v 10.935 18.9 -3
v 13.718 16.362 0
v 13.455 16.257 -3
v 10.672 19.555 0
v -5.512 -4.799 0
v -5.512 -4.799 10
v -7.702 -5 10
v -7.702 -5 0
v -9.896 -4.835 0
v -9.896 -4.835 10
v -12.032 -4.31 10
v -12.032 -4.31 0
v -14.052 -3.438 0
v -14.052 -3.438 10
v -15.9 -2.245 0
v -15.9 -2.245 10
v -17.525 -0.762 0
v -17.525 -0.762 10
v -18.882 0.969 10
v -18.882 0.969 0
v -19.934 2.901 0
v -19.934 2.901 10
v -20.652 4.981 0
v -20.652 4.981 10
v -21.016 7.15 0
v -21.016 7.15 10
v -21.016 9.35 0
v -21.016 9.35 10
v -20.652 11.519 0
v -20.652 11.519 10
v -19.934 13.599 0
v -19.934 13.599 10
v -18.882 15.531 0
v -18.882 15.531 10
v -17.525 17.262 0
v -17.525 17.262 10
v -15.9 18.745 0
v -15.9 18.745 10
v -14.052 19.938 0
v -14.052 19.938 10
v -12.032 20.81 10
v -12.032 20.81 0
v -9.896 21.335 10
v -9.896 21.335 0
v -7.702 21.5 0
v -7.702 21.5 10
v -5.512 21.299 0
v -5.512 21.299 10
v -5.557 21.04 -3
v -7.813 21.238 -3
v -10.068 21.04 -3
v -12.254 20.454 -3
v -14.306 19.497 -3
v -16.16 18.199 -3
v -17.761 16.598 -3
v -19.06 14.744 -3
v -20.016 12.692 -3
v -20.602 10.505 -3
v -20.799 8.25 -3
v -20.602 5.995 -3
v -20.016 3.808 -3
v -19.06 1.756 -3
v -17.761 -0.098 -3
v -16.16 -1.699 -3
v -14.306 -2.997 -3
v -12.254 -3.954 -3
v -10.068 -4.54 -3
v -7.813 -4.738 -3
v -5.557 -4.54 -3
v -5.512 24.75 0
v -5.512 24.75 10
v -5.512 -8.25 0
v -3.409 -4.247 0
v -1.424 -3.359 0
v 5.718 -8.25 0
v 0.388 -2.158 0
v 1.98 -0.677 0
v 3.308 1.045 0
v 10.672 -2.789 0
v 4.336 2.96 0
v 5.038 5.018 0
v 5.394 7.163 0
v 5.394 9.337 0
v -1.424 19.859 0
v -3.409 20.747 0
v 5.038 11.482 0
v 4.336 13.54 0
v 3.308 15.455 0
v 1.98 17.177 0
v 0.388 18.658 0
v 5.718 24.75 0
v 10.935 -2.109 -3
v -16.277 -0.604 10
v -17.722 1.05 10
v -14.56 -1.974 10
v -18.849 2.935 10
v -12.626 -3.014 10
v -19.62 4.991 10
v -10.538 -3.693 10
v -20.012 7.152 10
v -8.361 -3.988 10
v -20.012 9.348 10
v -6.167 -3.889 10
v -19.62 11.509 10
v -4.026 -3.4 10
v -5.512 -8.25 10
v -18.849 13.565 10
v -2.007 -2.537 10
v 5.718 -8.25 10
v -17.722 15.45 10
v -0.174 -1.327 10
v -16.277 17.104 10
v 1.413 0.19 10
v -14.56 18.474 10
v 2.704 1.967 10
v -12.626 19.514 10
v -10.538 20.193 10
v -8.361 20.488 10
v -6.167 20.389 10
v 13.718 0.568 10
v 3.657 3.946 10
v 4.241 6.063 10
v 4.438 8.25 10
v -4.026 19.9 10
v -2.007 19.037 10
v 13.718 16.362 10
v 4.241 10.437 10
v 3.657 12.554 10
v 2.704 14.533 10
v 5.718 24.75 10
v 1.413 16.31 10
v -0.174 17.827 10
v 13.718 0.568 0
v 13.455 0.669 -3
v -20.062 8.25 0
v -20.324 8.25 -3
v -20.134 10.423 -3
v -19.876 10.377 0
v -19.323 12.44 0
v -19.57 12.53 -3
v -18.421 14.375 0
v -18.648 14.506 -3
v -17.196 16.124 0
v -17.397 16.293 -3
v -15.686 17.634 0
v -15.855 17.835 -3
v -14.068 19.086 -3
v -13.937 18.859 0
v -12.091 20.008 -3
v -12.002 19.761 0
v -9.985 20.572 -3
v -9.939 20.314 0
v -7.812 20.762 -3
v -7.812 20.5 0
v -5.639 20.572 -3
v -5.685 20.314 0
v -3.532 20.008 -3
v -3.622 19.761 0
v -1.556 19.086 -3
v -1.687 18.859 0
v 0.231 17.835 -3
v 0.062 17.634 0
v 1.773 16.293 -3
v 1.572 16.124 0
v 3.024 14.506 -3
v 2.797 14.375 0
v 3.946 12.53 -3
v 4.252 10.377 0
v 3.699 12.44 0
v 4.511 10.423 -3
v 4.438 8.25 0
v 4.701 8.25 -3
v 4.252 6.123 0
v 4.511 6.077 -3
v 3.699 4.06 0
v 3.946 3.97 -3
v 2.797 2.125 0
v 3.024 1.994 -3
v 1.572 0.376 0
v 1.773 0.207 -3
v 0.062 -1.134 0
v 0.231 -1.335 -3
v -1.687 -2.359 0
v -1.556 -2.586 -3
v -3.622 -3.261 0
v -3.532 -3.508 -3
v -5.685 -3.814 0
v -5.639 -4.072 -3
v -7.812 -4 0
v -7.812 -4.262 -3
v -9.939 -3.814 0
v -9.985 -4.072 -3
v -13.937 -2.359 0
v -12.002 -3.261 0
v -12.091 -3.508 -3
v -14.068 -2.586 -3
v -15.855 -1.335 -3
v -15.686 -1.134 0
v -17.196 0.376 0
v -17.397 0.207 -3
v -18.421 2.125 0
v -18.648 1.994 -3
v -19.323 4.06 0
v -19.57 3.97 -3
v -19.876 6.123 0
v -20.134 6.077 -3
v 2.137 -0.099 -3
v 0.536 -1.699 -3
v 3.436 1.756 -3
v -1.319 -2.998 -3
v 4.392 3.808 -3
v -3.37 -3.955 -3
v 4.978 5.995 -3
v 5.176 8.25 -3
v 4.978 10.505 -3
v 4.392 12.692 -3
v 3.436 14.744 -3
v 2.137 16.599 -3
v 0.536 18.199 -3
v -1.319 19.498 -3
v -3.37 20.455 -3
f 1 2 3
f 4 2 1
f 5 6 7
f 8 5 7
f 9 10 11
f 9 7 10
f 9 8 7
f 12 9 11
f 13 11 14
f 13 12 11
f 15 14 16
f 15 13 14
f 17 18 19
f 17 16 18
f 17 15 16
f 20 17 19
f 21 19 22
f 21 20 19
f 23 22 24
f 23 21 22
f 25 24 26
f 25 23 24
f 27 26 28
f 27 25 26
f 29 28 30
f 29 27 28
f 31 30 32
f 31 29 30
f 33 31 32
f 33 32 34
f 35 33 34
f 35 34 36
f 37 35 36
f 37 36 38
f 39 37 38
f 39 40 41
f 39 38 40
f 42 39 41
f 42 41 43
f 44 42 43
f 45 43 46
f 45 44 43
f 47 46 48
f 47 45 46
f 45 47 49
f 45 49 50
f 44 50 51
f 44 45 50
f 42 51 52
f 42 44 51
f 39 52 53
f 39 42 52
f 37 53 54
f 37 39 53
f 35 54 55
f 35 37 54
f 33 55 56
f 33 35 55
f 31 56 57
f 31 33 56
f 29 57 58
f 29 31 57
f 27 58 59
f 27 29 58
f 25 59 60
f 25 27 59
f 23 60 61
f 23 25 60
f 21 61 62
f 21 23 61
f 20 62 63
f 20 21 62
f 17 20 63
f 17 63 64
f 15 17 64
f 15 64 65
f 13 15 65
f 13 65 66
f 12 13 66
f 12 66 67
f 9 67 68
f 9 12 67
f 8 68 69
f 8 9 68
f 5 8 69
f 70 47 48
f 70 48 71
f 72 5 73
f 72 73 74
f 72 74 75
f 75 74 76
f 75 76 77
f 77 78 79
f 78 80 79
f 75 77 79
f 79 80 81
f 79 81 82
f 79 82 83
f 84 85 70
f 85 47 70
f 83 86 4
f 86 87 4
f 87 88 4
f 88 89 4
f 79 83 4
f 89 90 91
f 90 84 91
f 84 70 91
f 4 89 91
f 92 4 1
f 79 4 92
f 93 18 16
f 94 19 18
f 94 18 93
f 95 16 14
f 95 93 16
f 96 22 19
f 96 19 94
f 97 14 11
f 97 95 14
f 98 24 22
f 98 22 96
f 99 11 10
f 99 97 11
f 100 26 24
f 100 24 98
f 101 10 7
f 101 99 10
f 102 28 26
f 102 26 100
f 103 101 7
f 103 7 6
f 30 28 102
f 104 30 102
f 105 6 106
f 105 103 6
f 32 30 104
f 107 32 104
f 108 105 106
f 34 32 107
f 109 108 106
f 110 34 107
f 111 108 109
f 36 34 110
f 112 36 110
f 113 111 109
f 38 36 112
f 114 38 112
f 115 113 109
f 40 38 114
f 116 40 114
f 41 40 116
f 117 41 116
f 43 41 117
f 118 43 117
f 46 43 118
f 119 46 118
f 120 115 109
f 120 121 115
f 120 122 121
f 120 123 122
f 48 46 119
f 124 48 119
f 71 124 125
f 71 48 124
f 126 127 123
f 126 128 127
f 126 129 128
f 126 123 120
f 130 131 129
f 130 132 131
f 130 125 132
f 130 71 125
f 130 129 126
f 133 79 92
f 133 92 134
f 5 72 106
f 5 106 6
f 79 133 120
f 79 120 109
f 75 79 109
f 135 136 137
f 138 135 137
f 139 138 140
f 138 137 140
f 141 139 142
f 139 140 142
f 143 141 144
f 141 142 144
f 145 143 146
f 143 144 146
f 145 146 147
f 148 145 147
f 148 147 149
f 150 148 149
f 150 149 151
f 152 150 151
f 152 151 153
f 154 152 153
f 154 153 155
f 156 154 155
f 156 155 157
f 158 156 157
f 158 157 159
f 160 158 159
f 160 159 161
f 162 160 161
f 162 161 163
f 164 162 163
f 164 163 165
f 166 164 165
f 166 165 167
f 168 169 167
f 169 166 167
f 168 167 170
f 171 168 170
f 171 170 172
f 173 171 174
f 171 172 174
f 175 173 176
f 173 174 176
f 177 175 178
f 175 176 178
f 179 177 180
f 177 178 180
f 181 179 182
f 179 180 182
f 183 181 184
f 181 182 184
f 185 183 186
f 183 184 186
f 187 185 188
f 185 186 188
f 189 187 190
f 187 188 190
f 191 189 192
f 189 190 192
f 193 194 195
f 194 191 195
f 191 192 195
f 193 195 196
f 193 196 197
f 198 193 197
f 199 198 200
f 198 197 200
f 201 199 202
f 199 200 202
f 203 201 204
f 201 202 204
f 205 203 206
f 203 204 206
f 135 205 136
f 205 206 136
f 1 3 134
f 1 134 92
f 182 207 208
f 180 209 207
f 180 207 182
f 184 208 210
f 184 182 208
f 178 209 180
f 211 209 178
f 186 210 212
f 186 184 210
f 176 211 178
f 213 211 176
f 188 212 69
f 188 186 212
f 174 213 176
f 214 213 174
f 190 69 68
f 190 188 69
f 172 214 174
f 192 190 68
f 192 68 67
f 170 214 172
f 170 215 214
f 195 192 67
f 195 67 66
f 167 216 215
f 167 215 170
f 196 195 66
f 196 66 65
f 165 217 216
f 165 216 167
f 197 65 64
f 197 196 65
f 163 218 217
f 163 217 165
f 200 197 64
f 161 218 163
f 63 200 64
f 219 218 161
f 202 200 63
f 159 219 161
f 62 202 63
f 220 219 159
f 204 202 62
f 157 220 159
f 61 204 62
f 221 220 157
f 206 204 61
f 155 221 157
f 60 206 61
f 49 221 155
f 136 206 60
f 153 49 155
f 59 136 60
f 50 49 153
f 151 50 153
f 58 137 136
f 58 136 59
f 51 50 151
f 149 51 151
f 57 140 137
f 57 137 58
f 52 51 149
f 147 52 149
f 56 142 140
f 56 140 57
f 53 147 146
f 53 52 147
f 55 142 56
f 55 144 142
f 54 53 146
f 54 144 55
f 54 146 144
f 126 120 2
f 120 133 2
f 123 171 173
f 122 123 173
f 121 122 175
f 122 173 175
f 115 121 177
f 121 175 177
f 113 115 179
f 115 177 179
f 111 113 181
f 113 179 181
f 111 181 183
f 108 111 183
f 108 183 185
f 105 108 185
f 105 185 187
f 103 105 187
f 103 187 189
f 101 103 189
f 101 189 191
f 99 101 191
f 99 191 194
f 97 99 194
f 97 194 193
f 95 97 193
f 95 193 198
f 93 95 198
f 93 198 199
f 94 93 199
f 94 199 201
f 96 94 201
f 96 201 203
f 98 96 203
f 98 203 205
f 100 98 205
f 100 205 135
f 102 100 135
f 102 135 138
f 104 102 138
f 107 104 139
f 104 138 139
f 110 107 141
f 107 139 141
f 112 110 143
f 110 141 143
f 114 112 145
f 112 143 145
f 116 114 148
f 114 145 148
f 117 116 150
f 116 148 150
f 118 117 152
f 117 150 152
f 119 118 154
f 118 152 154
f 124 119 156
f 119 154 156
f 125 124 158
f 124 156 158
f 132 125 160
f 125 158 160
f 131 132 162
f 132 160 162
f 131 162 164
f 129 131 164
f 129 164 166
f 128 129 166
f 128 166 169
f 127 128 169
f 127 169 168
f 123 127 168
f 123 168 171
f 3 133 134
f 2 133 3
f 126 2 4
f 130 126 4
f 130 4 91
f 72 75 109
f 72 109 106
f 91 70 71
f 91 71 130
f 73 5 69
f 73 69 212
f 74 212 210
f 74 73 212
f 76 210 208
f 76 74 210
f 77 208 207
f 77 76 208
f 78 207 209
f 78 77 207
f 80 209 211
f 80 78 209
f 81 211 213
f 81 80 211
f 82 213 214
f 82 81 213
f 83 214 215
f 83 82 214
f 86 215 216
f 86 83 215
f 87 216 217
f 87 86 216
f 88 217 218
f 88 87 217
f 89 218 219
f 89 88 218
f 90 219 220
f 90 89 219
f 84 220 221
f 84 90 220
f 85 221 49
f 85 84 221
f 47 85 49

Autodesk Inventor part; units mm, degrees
ref_plane "YZ Plane" through (0, 0, 0) normal (1, 0, 0) x (0, 1, 0)
ref_plane "XZ Plane" through (0, 0, 0) normal (0, 1, 0) x (-1, 0, 0)
ref_plane "XY Plane" through (0, 0, 0) normal (0, 0, 1) x (1, 0, 0)
sketch "Sketch1" plane through (0, 0, 0) normal (0, 0, 1) x (1, 0, 0)
  arc A0 (-5.5118, -5.25) -> (-5.5118, 21.75) centre (-8.0118, 8.25) ccw projected
  circle A1 centre (-7.8118, 8.25) radius 10 construction
  circle A2 centre (-7.8118, 8.25) radius 12.15 construction
  line L0 (-5.5118, -8.25) -> (-5.5118, -5.25) construction
  line L1 (7.4882, -8.25) -> (-5.5118, -8.25) construction
  line L2 (11.0118, -4.7265) -> (7.4882, -8.25) construction
  line L3 (11.0118, -4.7265) -> (11.0118, 21.2265) construction
  line L4 (11.0118, 21.2265) -> (7.4882, 24.75) construction
  line L5 (7.4882, 24.75) -> (-5.5118, 24.75) construction
  line L6 (-5.5118, 24.75) -> (-5.5118, 21.75) construction
  arc A3 (-5.5118, -5.25) -> (-5.5118, 21.75) centre (-8.0118, 8.25) ccw construction
  circle A4 centre (-7.8118, 8.25) radius 12.25
  circle A5 centre (-7.8118, 8.25) radius 13.25
  line L7 (-5.5118, 21.2989) -> (-5.5118, 24.75)
  line L8 (-5.5118, 24.75) -> (5.7178, 24.75)
  line L9 (5.7178, 24.75) -> (5.7178, -8.25)
  line L10 (5.7178, 24.75) -> (38.7178, 24.75) construction
  line L11 (5.7178, -8.25) -> (-5.5118, -8.25)
  line L12 (-5.5118, -8.25) -> (-5.5118, -4.7989)
  line L13 (13.7178, 16.3622) -> (5.7178, 16.3622)
  line L14 (5.7178, 16.3622) -> (5.7178, 0.5675)
  line L15 (5.7178, 0.5675) -> (13.7178, 0.5675)
  line L16 (13.7178, 0.5675) -> (13.7178, 16.3622)
  line L17 (13.7178, 16.3622) -> (5.7178, 0.5675) construction
  line L18 (5.7178, 16.3622) -> (13.7178, 0.5675) construction
  line L19 (13.7178, 0.5675) -> (5.7178, -8.25)
  line L20 (13.7178, 16.3622) -> (5.7178, 24.75)
  point P0 (0, 0)
  point P1 (9.7178, 8.4649)
  dimension "d0" = 24.5
  dimension "d1" = 26.5
  dimension "d2" = 90
  dimension "d7" = 8
extrude "Extrusion1" add sketch "Sketch1" along normal blind 10
sketch "Sketch2" plane through (0, 0, 0) normal (0, 0, -1) x (-1, 0, 0)
  line L0 (-5.7178, -8.25) -> (-5.7178, 24.75) projected
  circle A0 centre (7.8118, 8.25) radius 12.25 projected
  line L1 (5.5118, -8.25) -> (-5.7178, -8.25) projected
  line L2 (5.5118, -4.7989) -> (5.5118, -8.25) projected
  arc A1 (5.5118, -4.7989) -> (5.5118, 21.2989) centre (7.8118, 8.25) ccw projected
  line L3 (5.5118, 24.75) -> (5.5118, 21.2989) projected
  line L4 (-5.7178, 24.75) -> (5.5118, 24.75) projected
  circle A2 centre (7.8118, 8.25) radius 13.25
  line L5 (-13.7178, 16.3622) -> (-5.7178, 24.75) projected
  line L6 (-13.7178, 0.5675) -> (-13.7178, 16.3622) projected
  line L7 (-5.7178, -8.25) -> (-13.7178, 0.5675) projected
  line L8 (-13.7178, 16.3622) -> (-5.7178, 24.75) projected
  line L9 (-13.7178, 0.5675) -> (-13.7178, 16.3622) projected
  line L10 (-5.7178, -8.25) -> (-13.7178, 0.5675) projected
  line L11 (-11.0118, 21.2265) -> (-11.0118, -4.7265) construction
  line L12 (-10.6722, 19.5554) -> (-10.6722, -2.7892)
  line L13 (-5.7178, -8.25) -> (-13.7178, 0.5675) projected
  line L14 (-10.6722, 19.5554) -> (11.6724, 19.5554) construction
  point P0 (0, 0)
  dimension "d8" = 90
extrude "Extrusion2" add sketch "Sketch2" along normal blind 3 draft -5 contours L7 L6 L5 L12 | A2 A1
properties part number "cellSTORM_inverted_objectiveadapter"
